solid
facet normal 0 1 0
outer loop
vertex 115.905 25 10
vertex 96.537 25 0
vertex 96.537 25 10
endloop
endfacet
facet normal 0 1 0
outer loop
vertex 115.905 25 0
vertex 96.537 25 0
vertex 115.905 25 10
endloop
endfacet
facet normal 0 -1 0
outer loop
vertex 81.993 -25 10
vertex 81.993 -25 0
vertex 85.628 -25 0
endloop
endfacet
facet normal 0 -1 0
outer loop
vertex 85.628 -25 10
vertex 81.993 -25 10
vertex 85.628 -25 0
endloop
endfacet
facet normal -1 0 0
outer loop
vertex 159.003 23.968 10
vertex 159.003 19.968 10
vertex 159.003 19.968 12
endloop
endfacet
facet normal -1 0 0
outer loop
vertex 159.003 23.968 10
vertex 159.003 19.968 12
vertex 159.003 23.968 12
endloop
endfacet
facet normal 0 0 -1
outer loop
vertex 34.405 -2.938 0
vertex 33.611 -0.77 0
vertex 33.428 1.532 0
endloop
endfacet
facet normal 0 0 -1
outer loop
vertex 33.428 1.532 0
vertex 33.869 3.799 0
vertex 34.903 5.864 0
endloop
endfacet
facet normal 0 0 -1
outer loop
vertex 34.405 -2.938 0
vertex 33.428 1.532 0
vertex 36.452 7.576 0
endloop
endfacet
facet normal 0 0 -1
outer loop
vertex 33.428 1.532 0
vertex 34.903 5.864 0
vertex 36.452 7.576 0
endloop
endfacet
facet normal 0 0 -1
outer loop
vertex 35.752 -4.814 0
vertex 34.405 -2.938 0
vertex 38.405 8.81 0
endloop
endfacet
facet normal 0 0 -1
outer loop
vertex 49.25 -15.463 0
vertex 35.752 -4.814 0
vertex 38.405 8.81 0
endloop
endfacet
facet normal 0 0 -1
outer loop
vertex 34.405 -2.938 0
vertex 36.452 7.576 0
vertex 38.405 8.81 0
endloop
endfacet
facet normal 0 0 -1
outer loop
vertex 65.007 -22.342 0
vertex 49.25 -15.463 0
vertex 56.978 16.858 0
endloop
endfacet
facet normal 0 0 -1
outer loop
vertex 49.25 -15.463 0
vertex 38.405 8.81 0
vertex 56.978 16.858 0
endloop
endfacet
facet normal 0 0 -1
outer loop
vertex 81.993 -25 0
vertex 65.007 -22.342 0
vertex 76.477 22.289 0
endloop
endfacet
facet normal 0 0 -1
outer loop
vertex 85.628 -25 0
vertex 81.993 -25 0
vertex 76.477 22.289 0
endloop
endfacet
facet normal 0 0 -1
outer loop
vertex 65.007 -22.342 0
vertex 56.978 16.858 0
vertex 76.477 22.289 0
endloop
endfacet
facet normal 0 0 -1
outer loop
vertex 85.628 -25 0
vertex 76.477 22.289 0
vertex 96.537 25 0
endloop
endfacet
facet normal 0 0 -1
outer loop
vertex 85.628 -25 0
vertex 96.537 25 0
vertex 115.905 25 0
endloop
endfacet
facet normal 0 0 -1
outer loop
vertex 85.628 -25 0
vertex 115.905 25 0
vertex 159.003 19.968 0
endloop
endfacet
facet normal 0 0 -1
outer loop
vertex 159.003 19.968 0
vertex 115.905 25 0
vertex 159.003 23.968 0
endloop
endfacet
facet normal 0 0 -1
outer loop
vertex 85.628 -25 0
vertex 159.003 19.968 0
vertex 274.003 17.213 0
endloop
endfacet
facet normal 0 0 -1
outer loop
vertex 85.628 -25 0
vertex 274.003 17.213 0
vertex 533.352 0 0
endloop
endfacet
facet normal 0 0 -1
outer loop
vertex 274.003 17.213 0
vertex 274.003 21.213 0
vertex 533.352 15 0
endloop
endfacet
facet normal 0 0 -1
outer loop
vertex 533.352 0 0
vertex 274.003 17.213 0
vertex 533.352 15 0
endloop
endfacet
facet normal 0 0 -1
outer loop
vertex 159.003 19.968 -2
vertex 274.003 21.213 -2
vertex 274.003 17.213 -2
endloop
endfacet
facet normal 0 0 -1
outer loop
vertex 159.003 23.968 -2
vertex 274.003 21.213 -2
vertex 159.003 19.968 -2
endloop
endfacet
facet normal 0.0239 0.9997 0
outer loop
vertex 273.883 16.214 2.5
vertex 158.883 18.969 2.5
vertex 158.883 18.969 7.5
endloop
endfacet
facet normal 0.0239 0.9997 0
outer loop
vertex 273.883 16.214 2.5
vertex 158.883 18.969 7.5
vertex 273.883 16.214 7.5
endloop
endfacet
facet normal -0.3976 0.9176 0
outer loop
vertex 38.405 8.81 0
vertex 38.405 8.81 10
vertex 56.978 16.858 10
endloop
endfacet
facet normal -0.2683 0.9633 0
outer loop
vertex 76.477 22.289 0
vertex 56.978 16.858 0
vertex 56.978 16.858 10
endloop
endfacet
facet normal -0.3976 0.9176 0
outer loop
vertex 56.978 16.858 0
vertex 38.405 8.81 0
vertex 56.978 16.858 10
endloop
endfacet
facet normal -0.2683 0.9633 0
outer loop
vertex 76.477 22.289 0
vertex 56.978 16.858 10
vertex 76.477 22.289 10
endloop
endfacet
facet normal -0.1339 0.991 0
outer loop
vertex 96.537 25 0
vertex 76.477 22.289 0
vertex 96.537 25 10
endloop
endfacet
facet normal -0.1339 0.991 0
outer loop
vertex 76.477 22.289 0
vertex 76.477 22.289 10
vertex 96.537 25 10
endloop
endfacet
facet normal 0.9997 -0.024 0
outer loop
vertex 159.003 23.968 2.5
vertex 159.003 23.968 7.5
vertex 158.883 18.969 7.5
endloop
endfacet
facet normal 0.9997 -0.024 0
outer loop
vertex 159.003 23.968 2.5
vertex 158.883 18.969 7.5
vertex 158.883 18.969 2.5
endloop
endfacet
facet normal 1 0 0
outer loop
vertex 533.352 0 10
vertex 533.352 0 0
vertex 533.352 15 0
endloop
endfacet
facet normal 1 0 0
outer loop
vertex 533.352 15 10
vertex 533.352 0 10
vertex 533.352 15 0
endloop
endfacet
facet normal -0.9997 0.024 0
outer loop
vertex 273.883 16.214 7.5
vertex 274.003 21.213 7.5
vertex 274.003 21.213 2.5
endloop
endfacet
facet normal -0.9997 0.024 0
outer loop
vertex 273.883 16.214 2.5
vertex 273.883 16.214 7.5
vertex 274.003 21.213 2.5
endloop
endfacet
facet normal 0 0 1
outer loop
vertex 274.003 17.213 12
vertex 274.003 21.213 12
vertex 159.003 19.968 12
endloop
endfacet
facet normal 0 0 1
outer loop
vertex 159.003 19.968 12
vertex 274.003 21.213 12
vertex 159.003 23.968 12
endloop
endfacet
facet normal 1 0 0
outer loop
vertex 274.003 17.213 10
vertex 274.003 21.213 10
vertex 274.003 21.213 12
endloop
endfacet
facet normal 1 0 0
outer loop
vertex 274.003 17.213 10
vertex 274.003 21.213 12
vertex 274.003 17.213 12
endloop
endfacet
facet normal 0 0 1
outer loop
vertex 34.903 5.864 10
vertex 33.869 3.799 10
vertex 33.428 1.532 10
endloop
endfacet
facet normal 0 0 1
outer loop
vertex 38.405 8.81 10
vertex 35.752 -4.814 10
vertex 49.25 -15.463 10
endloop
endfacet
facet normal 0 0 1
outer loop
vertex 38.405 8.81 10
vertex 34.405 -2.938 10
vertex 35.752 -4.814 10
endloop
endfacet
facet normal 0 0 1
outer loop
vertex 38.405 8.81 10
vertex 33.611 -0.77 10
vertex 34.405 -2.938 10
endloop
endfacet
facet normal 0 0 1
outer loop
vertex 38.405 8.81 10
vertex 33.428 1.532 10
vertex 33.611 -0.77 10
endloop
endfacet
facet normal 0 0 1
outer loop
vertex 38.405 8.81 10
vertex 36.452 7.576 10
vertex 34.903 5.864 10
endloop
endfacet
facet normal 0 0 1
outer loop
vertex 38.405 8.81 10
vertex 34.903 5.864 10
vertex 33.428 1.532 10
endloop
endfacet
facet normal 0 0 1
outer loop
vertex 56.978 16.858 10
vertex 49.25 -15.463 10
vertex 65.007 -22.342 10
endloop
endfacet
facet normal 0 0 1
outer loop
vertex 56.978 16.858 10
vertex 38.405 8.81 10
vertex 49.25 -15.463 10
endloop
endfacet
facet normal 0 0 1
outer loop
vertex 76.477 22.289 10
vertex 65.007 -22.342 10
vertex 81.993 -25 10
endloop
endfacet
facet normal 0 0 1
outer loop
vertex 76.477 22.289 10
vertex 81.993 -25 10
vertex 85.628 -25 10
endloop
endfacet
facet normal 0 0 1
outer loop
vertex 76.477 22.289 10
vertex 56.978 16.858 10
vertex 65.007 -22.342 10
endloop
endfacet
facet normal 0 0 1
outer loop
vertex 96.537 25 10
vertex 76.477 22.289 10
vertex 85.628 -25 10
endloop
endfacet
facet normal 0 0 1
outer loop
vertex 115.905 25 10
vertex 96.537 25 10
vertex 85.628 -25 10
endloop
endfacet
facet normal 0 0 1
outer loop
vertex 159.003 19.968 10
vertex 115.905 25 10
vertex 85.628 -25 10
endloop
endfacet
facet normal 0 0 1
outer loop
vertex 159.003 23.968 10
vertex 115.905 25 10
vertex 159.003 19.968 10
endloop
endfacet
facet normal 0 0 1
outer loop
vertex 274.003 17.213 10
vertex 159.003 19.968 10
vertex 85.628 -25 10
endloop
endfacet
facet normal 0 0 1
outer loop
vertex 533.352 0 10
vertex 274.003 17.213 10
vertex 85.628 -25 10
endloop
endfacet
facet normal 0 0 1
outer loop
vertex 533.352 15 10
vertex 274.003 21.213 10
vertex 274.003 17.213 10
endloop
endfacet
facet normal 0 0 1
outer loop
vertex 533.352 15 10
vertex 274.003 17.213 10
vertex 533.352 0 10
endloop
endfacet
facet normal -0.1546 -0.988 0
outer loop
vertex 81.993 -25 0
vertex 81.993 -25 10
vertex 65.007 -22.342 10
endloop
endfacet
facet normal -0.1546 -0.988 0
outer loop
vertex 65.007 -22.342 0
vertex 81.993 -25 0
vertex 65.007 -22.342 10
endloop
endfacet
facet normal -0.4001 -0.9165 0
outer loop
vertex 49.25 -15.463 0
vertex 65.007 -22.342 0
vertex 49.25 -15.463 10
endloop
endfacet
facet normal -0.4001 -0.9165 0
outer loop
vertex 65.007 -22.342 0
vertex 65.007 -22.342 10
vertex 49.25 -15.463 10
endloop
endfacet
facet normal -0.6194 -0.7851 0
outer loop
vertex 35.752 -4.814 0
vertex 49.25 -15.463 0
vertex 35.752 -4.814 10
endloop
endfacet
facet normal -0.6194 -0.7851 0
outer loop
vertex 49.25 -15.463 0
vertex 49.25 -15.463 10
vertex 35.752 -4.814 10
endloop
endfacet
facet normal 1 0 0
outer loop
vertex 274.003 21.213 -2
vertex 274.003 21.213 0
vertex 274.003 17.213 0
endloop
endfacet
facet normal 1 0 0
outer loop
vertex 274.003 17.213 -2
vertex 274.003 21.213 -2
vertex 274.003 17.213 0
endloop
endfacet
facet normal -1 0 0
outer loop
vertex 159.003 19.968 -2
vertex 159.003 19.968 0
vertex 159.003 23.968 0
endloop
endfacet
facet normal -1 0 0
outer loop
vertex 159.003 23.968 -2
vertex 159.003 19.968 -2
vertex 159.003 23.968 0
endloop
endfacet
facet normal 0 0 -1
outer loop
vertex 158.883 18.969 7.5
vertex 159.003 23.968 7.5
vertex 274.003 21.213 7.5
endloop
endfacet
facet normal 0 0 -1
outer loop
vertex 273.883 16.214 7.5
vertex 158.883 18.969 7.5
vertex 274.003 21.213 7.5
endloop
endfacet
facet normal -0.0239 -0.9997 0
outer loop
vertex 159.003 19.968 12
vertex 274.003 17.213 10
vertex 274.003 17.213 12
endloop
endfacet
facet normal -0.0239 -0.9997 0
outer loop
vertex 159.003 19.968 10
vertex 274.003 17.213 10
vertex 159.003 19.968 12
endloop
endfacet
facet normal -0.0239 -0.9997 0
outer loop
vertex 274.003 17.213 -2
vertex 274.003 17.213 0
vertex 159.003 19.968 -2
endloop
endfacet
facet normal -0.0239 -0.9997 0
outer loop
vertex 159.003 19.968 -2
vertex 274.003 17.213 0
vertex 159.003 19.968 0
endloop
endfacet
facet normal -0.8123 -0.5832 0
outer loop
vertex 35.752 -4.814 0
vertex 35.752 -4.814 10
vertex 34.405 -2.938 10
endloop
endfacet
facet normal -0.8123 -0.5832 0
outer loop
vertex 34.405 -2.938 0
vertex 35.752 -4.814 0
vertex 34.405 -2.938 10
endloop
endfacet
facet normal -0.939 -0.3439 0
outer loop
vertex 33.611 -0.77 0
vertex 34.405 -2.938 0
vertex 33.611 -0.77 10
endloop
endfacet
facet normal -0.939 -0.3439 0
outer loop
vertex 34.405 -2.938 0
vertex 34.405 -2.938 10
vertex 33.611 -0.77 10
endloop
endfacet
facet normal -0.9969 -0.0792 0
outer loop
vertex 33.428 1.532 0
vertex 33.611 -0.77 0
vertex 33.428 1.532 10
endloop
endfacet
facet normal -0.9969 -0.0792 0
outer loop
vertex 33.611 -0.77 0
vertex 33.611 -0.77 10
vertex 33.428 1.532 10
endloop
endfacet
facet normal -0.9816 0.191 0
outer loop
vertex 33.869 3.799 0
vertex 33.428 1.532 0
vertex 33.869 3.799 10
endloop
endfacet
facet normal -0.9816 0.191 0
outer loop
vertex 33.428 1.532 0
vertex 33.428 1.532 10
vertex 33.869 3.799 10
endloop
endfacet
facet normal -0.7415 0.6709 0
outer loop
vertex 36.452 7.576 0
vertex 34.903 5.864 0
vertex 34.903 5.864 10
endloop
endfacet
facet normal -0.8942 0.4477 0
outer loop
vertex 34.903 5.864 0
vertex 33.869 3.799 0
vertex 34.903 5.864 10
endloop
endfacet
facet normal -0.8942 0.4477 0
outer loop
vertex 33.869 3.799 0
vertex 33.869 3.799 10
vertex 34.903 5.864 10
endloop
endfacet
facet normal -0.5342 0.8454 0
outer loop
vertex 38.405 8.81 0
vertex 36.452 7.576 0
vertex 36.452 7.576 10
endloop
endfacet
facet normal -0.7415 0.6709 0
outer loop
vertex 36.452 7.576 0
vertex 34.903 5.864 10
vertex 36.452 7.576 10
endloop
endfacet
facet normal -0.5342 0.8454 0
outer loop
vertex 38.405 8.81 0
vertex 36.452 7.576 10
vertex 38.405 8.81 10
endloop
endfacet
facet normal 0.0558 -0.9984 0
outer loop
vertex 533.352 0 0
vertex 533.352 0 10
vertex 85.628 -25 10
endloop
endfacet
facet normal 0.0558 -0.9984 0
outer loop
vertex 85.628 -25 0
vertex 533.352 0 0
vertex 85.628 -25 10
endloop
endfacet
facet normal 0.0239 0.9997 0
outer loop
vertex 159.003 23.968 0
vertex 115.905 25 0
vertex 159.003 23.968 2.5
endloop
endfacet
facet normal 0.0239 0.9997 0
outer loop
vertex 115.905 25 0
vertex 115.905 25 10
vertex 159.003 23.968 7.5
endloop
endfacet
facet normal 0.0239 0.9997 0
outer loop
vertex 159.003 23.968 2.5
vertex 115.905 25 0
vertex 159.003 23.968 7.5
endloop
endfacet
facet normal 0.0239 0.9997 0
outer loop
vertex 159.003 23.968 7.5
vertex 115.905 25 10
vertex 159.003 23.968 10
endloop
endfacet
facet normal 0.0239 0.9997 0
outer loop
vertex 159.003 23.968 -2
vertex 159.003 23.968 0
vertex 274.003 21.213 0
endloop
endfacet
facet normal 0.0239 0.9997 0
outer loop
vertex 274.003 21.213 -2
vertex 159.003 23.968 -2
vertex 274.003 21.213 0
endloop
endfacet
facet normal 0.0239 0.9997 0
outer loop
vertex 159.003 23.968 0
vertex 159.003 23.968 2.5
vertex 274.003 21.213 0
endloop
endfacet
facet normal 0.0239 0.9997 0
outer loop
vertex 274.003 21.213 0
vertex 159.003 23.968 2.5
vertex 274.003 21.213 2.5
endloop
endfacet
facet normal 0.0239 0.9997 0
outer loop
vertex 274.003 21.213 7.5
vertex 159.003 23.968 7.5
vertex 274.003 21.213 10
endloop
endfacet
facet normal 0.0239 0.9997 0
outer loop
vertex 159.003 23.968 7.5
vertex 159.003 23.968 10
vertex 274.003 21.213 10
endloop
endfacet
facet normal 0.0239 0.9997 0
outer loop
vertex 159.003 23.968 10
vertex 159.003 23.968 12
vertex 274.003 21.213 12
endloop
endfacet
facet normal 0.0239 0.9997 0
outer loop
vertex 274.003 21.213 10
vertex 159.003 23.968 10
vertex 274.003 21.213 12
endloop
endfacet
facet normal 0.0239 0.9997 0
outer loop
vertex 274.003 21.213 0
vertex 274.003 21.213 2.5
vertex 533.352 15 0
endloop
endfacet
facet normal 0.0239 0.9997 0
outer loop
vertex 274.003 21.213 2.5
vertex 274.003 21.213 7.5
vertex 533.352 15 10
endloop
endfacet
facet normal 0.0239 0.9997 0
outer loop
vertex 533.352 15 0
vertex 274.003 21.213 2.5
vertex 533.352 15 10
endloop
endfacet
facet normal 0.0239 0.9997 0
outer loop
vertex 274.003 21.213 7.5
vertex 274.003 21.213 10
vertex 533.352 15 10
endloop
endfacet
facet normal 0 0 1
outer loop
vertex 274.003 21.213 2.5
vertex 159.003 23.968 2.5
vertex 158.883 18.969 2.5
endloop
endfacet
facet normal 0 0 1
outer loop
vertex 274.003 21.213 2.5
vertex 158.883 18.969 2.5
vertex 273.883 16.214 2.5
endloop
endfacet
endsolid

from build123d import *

# Parameters (mm, degrees)
SKETCH1_W                = 500
SKETCH1_H                = 50
BOSS_EXTRUDE1_DEPTH      = 10
CUT_EXTRUDE1_DEPTH       = 11
BOSS_EXTRUDE3_DEPTH      = 2
BOSS_EXTRUDE3_DEPTH_BACK = 12
SKETCH4_W                = 115.032991515
SKETCH4_H                = 5
CUT_EXTRUDE2_DEPTH       = 5


with BuildPart() as part:
    # Sketch1 → Boss-Extrude1 (new body)
    with BuildSketch(Plane.XY):
        with Locations((283.352405613, 0)):
            Rectangle(SKETCH1_W, SKETCH1_H)
    extrude(amount=BOSS_EXTRUDE1_DEPTH)

    # Sketch2 → Cut-Extrude1 (cut, through all)
    with BuildSketch(Plane.XY.offset(10)):
        Polygon((533.352405613, 0), (85.627765445, -25), (533.352405613, -25), align=None)
        with BuildLine():
            Line((33.352405613, -25), (81.993040664, -25))
            ThreePointArc((81.993040664, -25), (56.907700084, -19.408398641), (35.752423976, -4.814063764))
            ThreePointArc((35.752423976, -4.814063764), (33.571532765, 2.680644565), (38.404725068, 8.809852636))
            ThreePointArc((38.404725068, 8.809852636), (66.634144242, 19.90850289), (96.536599016, 25))
            Line((96.536599016, 25), (33.352405613, 25))
            Line((33.352405613, 25), (33.352405613, -25))
        make_face()
        Polygon((115.905115224, 25), (533.352405613, 15), (533.352405613, 25), align=None)
    extrude(amount=-CUT_EXTRUDE1_DEPTH, mode=Mode.SUBTRACT)

    # Sketch3 → Boss-Extrude3 (add, two sides)
    with BuildSketch(Plane(origin=(0, 0, 0), x_dir=(-1, 0, 0), z_dir=(0, 0, -1))) as boss_extrude3_sk:
        Polygon((-159.0031787, 23.967580711), (-274.0031787, 21.212741893), (-274.0031787, 17.212741893), (-159.0031787, 19.967580711), align=None)
    extrude(amount=BOSS_EXTRUDE3_DEPTH)
    extrude(boss_extrude3_sk.sketch, amount=-BOSS_EXTRUDE3_DEPTH_BACK)

    # Sketch4 → Cut-Extrude2 (cut)
    with BuildSketch(Plane(origin=(0.665008284, 27.760590609, 0), x_dir=(0.9997132, -0.02394825, 0), z_dir=(0.02394825, 0.9997132, 0))):
        with Locations((215.900090662, -5)):
            Rectangle(SKETCH4_W, SKETCH4_H)
    extrude(amount=-CUT_EXTRUDE2_DEPTH, mode=Mode.SUBTRACT)


solid = part.part
